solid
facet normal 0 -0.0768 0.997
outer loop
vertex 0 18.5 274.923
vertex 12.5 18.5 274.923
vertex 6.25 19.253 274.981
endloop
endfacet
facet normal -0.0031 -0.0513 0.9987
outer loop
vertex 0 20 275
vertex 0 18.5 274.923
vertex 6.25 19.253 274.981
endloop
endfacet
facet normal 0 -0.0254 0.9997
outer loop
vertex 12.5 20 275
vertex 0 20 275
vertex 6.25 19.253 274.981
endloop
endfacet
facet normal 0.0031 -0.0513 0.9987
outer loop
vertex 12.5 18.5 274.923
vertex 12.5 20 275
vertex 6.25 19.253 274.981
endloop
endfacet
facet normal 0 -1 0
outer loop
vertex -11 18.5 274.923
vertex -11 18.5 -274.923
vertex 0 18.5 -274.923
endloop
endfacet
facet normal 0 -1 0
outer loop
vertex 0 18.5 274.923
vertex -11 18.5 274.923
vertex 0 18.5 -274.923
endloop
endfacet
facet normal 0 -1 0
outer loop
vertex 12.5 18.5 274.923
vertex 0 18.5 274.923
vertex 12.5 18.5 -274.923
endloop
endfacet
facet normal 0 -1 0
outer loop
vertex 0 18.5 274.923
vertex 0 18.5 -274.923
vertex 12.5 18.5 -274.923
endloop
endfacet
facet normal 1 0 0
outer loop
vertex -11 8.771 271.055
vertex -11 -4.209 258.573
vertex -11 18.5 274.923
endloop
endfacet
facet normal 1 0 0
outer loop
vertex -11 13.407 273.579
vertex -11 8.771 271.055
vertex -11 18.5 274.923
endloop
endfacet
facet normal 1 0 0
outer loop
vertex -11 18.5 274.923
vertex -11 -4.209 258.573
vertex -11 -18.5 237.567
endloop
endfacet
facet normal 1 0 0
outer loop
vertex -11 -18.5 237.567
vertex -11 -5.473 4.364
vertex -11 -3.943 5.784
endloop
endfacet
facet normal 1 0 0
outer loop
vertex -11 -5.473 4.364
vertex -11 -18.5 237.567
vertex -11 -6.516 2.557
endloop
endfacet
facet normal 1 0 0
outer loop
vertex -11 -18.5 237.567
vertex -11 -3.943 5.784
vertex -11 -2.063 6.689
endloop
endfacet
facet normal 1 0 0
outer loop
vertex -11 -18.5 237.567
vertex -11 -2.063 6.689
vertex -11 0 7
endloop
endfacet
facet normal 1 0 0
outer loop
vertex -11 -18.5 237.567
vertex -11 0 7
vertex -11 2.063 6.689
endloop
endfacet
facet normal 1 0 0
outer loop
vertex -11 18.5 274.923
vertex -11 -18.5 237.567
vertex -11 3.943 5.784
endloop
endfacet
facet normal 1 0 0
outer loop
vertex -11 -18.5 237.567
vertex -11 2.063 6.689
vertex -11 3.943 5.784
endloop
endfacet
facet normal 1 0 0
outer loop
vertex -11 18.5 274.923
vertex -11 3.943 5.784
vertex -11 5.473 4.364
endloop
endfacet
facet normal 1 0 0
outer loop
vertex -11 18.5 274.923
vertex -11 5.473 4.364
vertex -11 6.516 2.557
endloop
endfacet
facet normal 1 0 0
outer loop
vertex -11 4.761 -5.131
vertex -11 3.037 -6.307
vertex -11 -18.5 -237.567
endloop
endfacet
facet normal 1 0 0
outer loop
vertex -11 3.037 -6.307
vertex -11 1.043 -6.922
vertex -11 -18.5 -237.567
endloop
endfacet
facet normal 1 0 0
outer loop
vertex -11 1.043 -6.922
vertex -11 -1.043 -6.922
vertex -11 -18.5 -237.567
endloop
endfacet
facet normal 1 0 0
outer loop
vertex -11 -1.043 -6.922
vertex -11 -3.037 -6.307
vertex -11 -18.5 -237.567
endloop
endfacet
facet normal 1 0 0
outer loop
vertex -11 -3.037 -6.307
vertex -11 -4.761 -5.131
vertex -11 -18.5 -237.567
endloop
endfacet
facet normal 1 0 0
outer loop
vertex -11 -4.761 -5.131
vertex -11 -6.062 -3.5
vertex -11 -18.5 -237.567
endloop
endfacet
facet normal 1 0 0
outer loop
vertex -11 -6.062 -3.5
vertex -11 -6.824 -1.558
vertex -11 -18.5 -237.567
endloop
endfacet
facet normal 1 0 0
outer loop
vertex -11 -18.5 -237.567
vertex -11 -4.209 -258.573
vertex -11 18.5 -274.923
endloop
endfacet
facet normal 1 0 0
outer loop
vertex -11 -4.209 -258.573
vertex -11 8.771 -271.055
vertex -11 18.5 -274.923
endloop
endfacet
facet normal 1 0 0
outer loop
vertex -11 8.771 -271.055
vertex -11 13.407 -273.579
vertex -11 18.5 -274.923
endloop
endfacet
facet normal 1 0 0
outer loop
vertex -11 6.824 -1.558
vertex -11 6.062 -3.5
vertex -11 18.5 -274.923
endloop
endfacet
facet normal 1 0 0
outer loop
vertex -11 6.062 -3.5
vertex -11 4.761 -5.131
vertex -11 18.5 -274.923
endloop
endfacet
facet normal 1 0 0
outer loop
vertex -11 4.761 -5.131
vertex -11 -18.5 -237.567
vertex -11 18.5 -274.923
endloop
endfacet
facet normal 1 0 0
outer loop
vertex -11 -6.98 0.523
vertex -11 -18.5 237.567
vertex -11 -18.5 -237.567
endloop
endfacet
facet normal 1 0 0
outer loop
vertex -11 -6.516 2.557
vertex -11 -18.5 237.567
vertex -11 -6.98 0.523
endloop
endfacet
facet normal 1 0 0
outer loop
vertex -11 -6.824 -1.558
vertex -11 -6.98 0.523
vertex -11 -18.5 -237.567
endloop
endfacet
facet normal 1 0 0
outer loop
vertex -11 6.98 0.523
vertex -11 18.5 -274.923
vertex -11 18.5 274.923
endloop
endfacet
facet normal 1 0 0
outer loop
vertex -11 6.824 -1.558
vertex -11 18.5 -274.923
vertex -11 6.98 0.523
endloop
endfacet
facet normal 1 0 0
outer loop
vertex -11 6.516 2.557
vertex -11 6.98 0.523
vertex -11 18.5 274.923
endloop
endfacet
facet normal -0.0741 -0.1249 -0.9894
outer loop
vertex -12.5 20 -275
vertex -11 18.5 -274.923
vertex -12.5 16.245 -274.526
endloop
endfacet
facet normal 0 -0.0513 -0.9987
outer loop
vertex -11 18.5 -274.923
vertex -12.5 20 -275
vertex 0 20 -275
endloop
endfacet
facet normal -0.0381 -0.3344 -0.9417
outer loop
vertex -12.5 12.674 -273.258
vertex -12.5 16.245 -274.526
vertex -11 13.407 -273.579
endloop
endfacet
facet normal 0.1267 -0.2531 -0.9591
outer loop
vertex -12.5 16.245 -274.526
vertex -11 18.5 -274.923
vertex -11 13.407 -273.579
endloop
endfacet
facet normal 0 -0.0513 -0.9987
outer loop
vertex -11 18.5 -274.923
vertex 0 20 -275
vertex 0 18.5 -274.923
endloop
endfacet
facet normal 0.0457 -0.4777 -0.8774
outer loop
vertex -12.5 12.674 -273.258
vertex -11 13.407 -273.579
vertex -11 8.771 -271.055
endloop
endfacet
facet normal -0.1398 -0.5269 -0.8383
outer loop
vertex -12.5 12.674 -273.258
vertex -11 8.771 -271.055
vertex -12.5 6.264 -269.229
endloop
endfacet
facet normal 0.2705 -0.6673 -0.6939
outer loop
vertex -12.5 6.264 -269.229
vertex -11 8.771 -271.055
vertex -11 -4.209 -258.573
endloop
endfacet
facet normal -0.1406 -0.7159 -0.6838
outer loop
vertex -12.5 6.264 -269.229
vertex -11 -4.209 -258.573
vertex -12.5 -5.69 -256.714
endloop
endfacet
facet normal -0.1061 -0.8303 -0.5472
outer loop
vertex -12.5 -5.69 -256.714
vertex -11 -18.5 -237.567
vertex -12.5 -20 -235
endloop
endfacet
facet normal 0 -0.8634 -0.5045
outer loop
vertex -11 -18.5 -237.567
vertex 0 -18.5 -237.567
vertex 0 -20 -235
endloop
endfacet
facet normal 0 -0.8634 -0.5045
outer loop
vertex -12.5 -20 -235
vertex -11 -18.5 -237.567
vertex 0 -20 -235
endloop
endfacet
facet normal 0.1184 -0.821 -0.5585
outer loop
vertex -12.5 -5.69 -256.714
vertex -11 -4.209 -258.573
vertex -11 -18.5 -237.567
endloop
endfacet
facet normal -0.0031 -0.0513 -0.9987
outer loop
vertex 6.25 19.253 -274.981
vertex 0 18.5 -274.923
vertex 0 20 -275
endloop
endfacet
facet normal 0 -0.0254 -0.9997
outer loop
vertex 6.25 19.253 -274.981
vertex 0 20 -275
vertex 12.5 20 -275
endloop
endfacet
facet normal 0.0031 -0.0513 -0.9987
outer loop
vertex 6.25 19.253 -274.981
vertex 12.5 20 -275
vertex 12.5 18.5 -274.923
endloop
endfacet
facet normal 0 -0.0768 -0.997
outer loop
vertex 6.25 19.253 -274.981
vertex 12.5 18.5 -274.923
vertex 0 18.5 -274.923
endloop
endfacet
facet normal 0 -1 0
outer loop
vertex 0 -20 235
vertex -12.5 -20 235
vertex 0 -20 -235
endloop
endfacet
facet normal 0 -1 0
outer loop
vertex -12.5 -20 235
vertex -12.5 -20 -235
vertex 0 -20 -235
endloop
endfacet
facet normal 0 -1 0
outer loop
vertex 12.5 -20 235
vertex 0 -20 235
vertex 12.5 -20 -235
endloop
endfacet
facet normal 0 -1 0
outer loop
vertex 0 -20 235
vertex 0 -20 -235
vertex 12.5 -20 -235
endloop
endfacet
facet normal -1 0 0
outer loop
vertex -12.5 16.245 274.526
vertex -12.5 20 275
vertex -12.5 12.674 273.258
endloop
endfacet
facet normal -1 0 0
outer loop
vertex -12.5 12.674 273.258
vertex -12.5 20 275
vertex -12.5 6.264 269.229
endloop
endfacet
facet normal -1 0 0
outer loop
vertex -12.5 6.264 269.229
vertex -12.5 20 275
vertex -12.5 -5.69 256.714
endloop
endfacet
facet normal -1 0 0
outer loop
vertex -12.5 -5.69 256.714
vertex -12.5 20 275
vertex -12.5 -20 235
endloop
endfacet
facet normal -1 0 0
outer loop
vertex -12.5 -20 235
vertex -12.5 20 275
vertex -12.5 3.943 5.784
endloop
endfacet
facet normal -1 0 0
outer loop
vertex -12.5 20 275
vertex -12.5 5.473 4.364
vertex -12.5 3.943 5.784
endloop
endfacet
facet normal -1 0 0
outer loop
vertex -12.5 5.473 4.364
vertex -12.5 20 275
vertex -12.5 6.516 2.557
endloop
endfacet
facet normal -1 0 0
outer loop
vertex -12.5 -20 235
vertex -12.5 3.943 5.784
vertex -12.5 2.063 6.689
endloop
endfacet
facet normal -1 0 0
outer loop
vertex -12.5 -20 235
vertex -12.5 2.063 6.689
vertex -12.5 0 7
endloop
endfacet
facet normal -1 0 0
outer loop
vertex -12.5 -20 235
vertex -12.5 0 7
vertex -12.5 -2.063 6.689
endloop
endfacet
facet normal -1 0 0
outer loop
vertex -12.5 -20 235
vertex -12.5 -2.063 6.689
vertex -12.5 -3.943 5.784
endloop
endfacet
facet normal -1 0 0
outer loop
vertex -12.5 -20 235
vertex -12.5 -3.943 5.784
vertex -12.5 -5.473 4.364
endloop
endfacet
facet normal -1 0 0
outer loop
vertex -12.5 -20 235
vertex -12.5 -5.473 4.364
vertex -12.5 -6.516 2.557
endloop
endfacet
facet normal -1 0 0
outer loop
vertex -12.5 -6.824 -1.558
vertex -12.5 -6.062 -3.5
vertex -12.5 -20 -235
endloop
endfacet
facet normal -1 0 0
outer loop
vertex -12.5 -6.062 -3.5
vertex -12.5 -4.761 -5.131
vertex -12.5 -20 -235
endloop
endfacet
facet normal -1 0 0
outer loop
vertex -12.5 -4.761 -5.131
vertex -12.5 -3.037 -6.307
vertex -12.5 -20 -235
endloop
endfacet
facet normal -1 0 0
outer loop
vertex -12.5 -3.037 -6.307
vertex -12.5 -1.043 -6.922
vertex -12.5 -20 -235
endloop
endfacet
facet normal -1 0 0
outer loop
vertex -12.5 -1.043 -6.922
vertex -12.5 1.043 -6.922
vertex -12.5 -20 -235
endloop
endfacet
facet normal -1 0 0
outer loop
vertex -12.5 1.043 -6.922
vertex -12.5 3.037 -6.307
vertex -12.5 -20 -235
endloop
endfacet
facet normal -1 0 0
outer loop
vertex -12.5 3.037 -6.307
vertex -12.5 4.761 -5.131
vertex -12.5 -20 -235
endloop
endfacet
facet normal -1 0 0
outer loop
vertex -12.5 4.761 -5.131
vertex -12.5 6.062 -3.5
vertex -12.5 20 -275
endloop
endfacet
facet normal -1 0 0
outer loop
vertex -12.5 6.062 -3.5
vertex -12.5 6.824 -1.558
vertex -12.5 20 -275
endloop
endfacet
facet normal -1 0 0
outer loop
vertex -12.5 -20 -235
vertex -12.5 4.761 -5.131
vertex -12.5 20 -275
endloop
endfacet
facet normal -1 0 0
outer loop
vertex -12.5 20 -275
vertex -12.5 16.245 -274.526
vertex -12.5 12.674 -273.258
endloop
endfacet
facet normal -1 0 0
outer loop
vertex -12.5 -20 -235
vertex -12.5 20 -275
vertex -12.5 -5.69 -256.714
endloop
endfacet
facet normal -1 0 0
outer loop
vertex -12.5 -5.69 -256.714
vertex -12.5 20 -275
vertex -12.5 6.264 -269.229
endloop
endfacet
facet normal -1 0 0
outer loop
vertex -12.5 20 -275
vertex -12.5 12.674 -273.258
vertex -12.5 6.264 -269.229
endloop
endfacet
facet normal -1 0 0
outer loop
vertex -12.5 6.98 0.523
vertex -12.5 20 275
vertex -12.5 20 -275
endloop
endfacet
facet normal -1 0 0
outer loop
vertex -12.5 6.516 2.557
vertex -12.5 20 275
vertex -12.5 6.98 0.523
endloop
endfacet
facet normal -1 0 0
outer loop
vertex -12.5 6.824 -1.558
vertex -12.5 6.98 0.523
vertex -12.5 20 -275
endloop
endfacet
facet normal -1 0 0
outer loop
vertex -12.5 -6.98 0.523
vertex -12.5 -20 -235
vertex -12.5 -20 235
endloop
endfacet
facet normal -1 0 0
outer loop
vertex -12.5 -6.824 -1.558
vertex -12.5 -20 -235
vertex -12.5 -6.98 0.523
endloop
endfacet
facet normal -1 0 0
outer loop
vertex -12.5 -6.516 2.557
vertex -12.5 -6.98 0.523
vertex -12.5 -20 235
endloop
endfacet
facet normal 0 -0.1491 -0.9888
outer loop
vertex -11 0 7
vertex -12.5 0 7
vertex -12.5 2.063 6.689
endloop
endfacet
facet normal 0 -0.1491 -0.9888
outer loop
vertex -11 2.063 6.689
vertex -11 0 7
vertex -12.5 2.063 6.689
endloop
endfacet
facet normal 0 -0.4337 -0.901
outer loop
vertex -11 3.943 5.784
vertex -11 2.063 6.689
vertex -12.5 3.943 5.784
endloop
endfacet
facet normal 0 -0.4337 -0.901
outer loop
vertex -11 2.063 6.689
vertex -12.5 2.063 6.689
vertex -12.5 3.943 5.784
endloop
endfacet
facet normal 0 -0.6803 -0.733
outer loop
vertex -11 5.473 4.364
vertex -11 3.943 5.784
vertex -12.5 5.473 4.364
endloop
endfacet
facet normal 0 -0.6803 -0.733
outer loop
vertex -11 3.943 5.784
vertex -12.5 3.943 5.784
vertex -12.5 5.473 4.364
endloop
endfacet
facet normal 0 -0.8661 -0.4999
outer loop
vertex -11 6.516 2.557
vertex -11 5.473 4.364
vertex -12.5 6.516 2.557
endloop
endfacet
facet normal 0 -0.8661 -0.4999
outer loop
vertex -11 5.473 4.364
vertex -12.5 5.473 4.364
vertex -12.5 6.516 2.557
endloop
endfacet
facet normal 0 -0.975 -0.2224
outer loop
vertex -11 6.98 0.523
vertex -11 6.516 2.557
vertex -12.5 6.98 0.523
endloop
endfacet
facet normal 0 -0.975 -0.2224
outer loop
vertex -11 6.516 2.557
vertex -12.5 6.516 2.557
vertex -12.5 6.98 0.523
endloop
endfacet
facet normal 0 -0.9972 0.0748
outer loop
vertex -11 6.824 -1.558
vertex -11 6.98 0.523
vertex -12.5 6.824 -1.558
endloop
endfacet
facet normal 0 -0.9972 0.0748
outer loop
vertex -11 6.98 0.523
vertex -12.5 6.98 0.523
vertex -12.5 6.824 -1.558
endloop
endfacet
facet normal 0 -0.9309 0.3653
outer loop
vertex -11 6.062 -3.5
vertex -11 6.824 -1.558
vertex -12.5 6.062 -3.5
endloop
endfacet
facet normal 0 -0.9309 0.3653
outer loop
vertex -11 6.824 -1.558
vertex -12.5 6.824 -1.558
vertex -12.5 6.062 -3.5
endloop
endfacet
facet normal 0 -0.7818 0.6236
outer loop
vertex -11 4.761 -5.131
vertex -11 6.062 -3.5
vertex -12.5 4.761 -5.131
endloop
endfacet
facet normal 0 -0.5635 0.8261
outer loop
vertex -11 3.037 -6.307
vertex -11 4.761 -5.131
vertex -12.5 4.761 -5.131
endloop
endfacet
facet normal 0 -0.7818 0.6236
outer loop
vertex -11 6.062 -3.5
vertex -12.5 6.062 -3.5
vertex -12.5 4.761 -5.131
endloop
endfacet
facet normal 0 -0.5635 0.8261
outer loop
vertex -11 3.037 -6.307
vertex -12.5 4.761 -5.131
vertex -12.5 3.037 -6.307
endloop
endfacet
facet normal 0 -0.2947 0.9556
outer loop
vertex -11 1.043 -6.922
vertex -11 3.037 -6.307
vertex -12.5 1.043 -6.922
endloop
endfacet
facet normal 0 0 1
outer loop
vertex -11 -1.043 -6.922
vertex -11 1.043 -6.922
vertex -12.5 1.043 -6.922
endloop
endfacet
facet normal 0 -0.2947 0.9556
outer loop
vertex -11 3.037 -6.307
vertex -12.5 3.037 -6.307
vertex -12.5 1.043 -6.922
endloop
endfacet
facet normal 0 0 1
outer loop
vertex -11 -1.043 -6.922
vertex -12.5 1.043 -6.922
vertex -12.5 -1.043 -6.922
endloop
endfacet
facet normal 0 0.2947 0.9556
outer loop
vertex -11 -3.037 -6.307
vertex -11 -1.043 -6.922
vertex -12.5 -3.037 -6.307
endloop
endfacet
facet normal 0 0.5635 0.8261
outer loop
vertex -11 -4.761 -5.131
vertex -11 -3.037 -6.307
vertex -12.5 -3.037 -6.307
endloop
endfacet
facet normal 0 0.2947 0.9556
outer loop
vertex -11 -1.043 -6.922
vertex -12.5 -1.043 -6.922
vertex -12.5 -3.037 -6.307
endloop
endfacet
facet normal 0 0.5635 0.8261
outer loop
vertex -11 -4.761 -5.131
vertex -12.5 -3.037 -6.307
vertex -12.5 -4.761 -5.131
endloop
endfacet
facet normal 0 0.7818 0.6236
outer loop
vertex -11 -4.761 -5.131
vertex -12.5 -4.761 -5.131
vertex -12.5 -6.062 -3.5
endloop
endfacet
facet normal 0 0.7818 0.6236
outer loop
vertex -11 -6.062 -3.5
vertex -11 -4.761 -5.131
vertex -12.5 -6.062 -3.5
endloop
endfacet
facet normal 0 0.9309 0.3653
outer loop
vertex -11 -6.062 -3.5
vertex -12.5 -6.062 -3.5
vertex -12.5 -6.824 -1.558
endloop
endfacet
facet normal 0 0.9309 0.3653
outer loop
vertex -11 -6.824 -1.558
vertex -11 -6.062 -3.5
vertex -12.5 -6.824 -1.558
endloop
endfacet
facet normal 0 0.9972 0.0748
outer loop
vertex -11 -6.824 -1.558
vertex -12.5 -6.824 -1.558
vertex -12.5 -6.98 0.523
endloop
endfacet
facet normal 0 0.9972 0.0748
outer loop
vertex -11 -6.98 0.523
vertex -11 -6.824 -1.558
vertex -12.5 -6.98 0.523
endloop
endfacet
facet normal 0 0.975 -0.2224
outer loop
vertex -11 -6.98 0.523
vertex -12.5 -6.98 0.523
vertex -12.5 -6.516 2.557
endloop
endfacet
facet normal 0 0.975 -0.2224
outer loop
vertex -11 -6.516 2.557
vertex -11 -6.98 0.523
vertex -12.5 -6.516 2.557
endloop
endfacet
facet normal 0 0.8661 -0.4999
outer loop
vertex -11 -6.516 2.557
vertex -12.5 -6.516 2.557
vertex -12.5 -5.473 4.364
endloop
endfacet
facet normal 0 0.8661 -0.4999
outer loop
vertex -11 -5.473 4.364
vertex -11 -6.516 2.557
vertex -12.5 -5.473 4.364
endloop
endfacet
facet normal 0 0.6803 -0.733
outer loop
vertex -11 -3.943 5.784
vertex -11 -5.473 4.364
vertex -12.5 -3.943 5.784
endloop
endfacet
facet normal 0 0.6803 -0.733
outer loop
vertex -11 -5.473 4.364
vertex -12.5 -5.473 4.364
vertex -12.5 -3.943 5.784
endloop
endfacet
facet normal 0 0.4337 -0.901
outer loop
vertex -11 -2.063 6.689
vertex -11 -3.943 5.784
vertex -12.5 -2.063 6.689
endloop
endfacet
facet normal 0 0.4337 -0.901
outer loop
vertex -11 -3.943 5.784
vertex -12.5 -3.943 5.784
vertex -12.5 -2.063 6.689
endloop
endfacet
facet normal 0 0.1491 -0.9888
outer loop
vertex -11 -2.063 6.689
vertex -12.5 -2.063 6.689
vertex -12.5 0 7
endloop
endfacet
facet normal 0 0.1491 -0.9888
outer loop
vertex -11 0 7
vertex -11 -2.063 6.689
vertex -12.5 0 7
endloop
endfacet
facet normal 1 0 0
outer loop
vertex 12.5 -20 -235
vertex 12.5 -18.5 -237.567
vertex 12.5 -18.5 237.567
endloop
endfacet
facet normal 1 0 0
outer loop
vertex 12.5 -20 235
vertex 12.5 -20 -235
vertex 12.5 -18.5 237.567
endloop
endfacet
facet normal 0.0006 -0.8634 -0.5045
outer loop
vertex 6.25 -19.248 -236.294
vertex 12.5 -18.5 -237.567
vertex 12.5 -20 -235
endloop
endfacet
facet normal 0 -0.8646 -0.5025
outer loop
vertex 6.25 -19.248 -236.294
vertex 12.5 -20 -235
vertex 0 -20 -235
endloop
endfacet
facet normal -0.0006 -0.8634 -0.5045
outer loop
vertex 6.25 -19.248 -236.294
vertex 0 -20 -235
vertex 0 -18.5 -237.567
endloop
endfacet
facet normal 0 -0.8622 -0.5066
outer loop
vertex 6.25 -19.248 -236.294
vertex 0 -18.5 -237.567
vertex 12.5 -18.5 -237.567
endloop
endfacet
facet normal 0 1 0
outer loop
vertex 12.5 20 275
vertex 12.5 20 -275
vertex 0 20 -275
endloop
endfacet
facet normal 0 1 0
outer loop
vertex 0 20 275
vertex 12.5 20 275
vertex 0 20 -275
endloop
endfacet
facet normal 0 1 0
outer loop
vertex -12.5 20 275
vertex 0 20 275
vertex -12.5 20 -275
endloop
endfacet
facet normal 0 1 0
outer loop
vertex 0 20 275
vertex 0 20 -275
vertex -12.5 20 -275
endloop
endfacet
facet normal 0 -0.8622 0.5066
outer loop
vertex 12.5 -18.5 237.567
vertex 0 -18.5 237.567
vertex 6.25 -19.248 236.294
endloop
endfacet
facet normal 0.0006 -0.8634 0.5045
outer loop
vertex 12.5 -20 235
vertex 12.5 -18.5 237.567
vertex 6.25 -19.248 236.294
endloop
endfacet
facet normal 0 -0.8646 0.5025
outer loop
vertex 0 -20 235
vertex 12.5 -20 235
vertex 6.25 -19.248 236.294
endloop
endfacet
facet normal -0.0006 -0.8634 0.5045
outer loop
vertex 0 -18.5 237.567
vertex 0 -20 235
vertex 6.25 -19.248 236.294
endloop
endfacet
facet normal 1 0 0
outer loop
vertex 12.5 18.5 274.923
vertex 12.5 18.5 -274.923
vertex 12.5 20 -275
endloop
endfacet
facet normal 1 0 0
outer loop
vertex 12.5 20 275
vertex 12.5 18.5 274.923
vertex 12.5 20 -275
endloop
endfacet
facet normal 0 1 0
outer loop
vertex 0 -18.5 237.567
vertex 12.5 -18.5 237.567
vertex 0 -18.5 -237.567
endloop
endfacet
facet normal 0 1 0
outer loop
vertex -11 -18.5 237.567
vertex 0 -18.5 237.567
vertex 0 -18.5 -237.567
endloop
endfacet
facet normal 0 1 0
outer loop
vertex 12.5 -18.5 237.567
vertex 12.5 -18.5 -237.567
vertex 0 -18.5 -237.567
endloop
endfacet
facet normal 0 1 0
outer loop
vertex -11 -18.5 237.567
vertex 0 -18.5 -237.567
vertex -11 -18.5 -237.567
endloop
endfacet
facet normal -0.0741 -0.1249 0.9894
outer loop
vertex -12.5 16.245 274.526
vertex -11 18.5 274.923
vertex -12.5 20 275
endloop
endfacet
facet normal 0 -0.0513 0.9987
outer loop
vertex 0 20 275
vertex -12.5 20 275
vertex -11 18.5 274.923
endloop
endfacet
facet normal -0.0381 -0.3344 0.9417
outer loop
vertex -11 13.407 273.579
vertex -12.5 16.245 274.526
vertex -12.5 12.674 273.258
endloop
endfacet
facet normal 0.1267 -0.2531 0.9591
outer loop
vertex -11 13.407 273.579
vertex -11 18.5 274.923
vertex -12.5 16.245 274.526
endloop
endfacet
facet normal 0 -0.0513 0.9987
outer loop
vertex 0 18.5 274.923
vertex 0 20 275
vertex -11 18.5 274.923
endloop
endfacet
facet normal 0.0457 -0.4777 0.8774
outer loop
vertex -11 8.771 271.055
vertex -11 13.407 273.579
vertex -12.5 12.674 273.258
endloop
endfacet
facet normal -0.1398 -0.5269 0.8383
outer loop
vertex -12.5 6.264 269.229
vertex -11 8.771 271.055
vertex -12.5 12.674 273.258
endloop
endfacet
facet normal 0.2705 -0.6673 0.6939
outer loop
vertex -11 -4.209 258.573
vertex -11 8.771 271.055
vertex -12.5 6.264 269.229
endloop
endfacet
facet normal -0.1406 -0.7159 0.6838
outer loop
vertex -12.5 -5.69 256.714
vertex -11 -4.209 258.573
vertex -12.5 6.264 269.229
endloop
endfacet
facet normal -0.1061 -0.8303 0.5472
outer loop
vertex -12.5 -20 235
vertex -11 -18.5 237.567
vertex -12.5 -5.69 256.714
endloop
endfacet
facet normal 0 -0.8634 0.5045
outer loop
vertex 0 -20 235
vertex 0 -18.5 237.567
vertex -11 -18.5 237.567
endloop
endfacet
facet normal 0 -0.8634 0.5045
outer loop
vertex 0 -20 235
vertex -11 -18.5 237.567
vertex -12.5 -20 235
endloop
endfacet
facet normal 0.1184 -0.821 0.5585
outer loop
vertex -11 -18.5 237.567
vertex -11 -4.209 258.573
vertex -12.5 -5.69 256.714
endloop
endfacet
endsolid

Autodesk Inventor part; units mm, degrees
ref_plane "YZ Plane" through (0, 0, 0) normal (1, 0, 0) x (0, 1, 0)
ref_plane "XZ Plane" through (0, 0, 0) normal (0, 1, 0) x (-1, 0, 0)
ref_plane "XY Plane" through (0, 0, 0) normal (0, 0, 1) x (1, 0, 0)
sketch "Sketch1" plane through (0, 0, 0) normal (0, 0, 1) x (1, 0, 0)
  line L0 (-12.5, -20) -> (12.5, -20)
  line L1 (12.5, -20) -> (12.5, 20)
  line L2 (12.5, 20) -> (-12.5, 20)
  line L3 (-12.5, 20) -> (-12.5, -20)
  line L4 (-12.5, -20) -> (12.5, 20) construction
  line L5 (12.5, -20) -> (-12.5, 20) construction
  line L6 (-11, 18.5) -> (12.5, 18.5)
  line L7 (12.5, -18.5) -> (-11, -18.5)
  line L8 (-11, -18.5) -> (-11, 18.5)
  line L9 (0, 0) -> (-11, 0) construction
  dimension "d0" = 25
  dimension "d1" = 40
  dimension "d18" = 1.5
  dimension "d19" = 1.5
extrude "Extrusion1" add sketch "Sketch1" along normal mid plane 550 contours L3 L2 L1 L6 L8 L7 L0
sketch "Sketch2" plane through (0, 0, 0) normal (1, 0, 0) x (0, 1, 0)
  line L0 (-20, -275) -> (-20, 275) projected
  line L1 (20, 275) -> (-20, 275) projected
  line L2 (20, -275) -> (20, 275) projected
  line L3 (-20, -275) -> (20, -275) projected
  line L4 (20, -275) -> (3.094, -275) construction
  line L5 (3.094, -275) -> (-20, -235) construction
  spline S0 degree 2 poles (20, -275) (3.094, -275) (-20, -235) knots 1 1 1 2 2 2
  point P0 (0, 0)
  dimension "d7" = 40
  dimension "d8" = 30
extrude "Extrusion2" cut sketch "Sketch2" along normal through all both and the other way through all contours L0 S0 L3
mirror "Mirror1" about plane through (0, 0, 0) normal (0, 0, 1) of "Extrusion2"
sketch "Sketch3" plane through (-12.5, 20, -275) normal (-1, 0, 0) x (0, 0, 1)
  circle A0 centre (275, -20) radius 7
  line L0 (270, -24.899) -> (270, -15.101)
  line L1 (280, -15.101) -> (280, -24.899)
  circle A1 centre (275, -20) radius 12.5
  dimension "d11" = 14
  dimension "d12" = 10
  dimension "d26" = 25
extrude "Extrusion3" cut sketch "Sketch3" against normal up to next contours A0 L1 | L1 A0 L0 | L0 A0
properties part number "profile" material "Aluminum 6061"
